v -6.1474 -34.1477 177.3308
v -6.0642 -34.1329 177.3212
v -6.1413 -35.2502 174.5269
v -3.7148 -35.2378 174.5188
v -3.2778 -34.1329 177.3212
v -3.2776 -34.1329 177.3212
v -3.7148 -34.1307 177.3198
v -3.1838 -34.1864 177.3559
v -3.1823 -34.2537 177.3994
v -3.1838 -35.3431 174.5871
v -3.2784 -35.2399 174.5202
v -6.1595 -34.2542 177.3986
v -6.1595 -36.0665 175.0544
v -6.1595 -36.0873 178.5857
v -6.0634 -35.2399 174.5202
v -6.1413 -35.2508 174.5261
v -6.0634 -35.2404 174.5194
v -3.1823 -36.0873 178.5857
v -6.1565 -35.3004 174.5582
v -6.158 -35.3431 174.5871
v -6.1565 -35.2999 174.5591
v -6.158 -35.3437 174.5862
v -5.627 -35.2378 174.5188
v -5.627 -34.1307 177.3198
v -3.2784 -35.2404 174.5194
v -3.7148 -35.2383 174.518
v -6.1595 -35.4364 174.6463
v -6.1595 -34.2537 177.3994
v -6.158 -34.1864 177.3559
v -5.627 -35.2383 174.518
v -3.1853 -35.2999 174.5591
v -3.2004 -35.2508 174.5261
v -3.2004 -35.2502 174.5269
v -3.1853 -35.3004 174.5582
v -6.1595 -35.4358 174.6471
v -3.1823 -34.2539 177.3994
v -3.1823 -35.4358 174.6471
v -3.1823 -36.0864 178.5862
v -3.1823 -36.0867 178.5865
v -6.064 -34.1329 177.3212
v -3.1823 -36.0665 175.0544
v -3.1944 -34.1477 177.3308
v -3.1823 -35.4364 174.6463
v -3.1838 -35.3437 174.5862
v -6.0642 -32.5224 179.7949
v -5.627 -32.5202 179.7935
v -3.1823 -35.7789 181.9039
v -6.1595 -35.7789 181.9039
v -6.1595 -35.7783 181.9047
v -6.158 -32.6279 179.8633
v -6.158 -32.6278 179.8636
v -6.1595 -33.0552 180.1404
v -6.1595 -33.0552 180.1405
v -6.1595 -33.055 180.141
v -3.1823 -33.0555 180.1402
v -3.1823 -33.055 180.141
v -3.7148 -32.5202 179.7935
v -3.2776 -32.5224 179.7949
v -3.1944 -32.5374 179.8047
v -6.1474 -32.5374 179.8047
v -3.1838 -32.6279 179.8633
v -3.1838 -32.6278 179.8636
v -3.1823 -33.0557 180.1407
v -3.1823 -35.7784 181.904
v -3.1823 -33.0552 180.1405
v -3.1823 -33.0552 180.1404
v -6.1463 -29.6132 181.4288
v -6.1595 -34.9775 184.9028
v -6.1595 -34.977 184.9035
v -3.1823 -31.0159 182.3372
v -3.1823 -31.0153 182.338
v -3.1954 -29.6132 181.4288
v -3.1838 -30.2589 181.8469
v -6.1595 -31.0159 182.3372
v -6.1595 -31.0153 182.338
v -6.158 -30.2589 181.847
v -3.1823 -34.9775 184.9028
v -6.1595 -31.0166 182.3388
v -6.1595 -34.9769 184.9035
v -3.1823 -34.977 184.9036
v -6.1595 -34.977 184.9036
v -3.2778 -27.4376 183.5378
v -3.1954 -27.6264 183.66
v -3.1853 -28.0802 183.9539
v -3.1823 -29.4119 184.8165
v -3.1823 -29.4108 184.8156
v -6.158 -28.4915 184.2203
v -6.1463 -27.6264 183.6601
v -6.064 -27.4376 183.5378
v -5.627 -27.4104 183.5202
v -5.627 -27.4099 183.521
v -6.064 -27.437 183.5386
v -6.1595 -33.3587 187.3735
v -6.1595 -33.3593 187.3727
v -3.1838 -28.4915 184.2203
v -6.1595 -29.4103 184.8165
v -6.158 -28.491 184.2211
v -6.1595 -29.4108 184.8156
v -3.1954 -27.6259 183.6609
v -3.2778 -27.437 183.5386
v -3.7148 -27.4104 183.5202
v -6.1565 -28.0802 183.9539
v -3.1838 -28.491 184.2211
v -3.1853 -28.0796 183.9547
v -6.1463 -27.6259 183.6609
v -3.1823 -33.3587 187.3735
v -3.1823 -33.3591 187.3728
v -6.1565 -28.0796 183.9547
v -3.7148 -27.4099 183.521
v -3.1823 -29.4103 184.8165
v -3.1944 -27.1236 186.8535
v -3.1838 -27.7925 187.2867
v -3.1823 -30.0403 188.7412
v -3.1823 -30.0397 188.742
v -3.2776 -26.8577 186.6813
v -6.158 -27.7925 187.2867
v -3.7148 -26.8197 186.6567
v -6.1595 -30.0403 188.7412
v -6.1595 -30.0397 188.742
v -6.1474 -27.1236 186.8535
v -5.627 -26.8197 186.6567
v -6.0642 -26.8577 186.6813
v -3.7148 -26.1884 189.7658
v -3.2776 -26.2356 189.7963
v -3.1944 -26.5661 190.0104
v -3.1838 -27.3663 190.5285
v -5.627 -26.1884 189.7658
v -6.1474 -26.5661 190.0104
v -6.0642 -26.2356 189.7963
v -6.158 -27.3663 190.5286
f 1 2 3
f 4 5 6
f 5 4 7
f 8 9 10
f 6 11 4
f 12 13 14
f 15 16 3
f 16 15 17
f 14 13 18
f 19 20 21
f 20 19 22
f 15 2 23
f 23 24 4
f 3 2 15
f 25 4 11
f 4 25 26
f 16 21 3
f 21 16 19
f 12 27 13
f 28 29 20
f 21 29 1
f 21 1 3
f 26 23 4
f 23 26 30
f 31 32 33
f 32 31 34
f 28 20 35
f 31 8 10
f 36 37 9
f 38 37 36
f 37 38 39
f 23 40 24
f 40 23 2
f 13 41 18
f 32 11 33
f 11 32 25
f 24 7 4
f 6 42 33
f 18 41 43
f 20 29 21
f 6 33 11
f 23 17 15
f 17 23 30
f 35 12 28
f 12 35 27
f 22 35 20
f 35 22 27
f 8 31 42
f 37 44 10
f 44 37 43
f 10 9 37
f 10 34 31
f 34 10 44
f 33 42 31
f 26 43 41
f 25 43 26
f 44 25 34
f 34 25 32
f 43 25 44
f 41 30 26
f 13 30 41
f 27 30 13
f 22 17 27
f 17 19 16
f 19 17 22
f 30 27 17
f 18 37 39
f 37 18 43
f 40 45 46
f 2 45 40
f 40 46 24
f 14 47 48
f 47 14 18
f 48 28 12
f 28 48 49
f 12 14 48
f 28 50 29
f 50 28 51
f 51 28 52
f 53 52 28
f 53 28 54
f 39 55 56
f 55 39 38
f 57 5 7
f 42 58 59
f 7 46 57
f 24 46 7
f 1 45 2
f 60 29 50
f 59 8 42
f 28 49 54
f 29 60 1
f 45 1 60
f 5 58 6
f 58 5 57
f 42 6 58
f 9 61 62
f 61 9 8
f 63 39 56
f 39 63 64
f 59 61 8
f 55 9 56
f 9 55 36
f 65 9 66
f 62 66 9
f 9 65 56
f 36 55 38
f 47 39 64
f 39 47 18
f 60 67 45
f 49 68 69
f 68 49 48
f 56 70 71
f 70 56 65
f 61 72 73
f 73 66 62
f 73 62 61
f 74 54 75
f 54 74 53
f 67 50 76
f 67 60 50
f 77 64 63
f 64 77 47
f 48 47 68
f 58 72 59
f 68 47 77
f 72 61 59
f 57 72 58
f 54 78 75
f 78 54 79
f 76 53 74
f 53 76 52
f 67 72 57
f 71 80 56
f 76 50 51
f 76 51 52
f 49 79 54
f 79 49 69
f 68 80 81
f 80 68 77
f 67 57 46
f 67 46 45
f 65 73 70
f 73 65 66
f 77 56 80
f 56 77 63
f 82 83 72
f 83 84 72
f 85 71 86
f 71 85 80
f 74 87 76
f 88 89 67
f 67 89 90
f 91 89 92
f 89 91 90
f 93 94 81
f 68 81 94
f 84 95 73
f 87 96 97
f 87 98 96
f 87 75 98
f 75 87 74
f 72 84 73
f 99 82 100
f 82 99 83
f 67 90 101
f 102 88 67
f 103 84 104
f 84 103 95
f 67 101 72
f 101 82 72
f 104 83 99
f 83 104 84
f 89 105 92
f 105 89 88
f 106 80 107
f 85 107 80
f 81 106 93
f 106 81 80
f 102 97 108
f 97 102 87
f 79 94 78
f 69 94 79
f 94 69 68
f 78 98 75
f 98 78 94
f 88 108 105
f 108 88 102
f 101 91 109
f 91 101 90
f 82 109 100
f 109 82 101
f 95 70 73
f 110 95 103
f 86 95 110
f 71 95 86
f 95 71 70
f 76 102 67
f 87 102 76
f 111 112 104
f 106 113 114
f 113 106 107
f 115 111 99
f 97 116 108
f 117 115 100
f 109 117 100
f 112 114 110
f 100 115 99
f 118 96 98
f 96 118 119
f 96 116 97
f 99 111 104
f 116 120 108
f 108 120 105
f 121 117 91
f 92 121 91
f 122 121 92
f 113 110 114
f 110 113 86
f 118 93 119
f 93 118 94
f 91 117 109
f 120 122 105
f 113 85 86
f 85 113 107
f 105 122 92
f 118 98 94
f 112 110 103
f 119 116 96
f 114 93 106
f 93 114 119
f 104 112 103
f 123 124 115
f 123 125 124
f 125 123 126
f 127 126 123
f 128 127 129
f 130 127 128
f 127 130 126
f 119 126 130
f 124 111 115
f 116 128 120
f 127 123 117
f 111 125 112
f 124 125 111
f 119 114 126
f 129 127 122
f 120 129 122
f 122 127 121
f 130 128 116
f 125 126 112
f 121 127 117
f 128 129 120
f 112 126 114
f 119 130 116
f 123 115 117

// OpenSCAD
// SOUNDBOX part: harp_wood_inside1
// Inner lining strip. Thin in the e2 direction (OBB thickness ~2.98 model units),
// broad face spans e0 (sweep/stacking axis, ~17.72) x e1 (~7.10).
// Cross-section outline shape varies along the e0 axis -> built as a LOFT:
// hull() of consecutive stacked cross-section polygons (each linear_extrude'd a hair).
//
// Frame contract: rebuild in part PRINCIPAL frame, place with multmatrix.
//   world = centroid + u*e1 + v*e2 + w*e0   (local x=u along e1, y=v along e2, z=w along e0)
// Outline points are (e1, e2) pairs; sections are positioned at z = s along e0.

module sb_harp_wood_inside1() {
    // ---- key dimensions (model world units) ----
    // OBB extents: e0=17.717 (sweep), e1=7.103 (width), e2=2.977 (thickness, thin axis)
    eps = 0.001;            // slab thickness used per section for hull lofting

    // centroid (world)
    cx = -4.670895242189419;
    cy = -32.86783006658697;
    cz = 179.47082189015964;

    // principal axes
    // e0 (section/stacking axis), e1 (outline x), e2 (outline y, thin)
    e0 = [-7.198236352063046e-08, 0.5435756491694905, 0.8393601811081832];
    e1 = [-3.8562726048548236e-05, 0.839360180482577, -0.5435756487676503];
    e2 = [0.9999999992564554, 3.2407144580085266e-05, -2.090133971594858e-05];

    // section positions along e0 (local z) and their (e1,e2) outlines
    s = [
        -5.445743567141493,
        -2.4929627001441386,
        0.45981816685321597,
        3.4125990338505705,
        6.365379900847925,
        9.31816076784528,
        12.270941634842634
    ];

    outline0 = [
        [-0.28423858061108387, 1.488589415933371],
        [-0.28412097685894766, -1.4886113282819196],
        [-0.037238011977131835, -1.4886018432883672],
        [0.46663292684326274, -1.4885824645214034],
        [0.5771064702357185, -1.4870652117922991],
        [0.6285866266420308, -1.485607450292956],
        [0.6877653271956894, -1.470423157369534],
        [0.7000740725017132, -1.3924884191281677],
        [0.7026030400469345, -0.9560731261482711],
        [0.7025378561735616, 0.9561275620747436],
        [0.6999753492587257, 1.3925428977992214],
        [0.6876523202368277, 1.4704769278158705],
        [0.6284641586642077, 1.4856552405996881],
        [0.5769838903505793, 1.48710976204192],
        [0.46651343259493316, 1.4886182796209617],
        [0.16757433444905967, 1.4886072631346956]
    ];

    outline1 = [
        [-2.2211947008880837, 1.4885149353038583],
        [-2.2210802990409326, -1.488685809034434],
        [-1.1255523244791623, -1.488643703018274],
        [-0.5278931458392201, -1.488620724589759],
        [-0.037238011977131835, -1.4886018432883672],
        [0.04289933822961878, -1.4870857601435665],
        [0.08902997589549422, -1.4764972492085515],
        [0.10672122392953276, -1.3932961147342884],
        [0.1092447784548436, -0.9560959480282831],
        [0.10920803936049572, 4.515133049092299e-06],
        [0.10917130027530653, 0.9561047398758028],
        [0.10662244039492941, 1.3933042348610105],
        [0.0889247982433845, 1.476504009687727],
        [0.04279334694764336, 1.48708945274709],
        [-0.03735241382428245, 1.4885989010499256],
        [-0.4884652114010084, 1.4885817935922496],
        [-1.1256501377231491, 1.488557280376455]
    ];

    outline2 = [
        [-3.7660075997312097, 1.4884555318457646],
        [-3.765893197884059, -1.4887452124925282],
        [-0.5213326521875876, -1.4886205396602965],
        [-0.011937596648640247, -1.4870879643085595],
        [0.09594495176406193, -1.4764970804691762],
        [0.11385308403864391, -1.3932959374691758],
        [0.11639978513572624, -0.9560957698465659],
        [0.11632630695618618, 0.9561049180575201],
        [0.11373931284420502, 1.3933044115497653],
        [0.0958199835946415, 1.4765041776662424],
        [-0.012051882236779665, 1.4870872482631672],
        [-0.5214387597285743, 1.488580204996925],
        [-1.553588078503163, 1.488540805686649]
    ];

    outline3 = [
        [-4.723523455708495, 1.4884187070218255],
        [-4.723409053861344, -1.4887820373164673],
        [-4.707726671315054, -1.4887814586841805],
        [-0.28671187640929485, -1.488611543641521],
        [-0.003589048072957457, -1.4885997406002451],
        [0.8983161288740833, -1.4870535031523562],
        [1.6675546817343883, -1.4754005782067228],
        [1.6674313941580925, 1.4755281072835964],
        [0.898213339478771, 1.48712218669846],
        [-0.0037034498651404846, 1.4885995732265742],
        [-1.804047564743576, 1.4885309092462617],
        [-4.308168738395276, 1.4884346832777189]
    ];

    outline4 = [
        [-4.707837871248055, 1.4884190473585353],
        [-4.707726671315054, -1.4887814586841805],
        [-3.8931636419651827, -1.4887501986067415],
        [-1.2486494798911787, -1.488648576857551],
        [-0.003589048072957457, -1.4885997406002451],
        [1.0916765075924113, -1.4870456296219972],
        [1.5817564910248378, -1.4855700459115404],
        [2.1223212090011883, -1.4753816883836677],
        [2.347302295768502, -1.393013734405529],
        [2.3796327019090335, -0.9560084031372116],
        [2.3796042571758145, 9.062983157617328e-05],
        [2.379559223747816, 0.9561918079297159],
        [2.3471952329983496, 1.3931944163085073],
        [2.122207816738517, 1.475545566975609],
        [1.5816423173806624, 1.4856919300442955],
        [1.0915622219951109, 1.4871298213683084],
        [-0.0037034498651404846, 1.4885995732265742],
        [-1.2487638817383293, 1.488552167480741],
        [-2.9212122155895672, 1.4884879307064505]
    ];

    outline5 = [
        [-2.665845037069713, 1.488497671003108],
        [-2.6657306352225625, -1.488703073335185],
        [0.011619597568966356, -1.4870871675198238],
        [0.8084718621407894, -1.476468868390543],
        [1.1252608702512332, -1.3932571993227907],
        [1.170493946504207, -0.9560553921558652],
        [1.1704655017343435, 4.4594487238224526e-05],
        [1.1704204683429902, 0.9561448189110628],
        [1.1251537924104658, 1.393343149953579],
        [0.8083666845161694, 1.4765316752499993],
        [0.011513606277830046, 1.4870882837894122]
    ];

    outline6 = [
        [-1.3929881582241253, 1.487034028716704],
        [-1.3928738726176633, -1.4871416606921806],
        [-0.4396003210213495, -1.476517350421667],
        [-0.04585224169721336, -1.3933022468277474],
        [0.010381785559919088, -0.9561000168725035],
        [0.010351739837562768, -3.029090070105441e-08],
        [0.010308307389539806, 0.9561004326130031],
        [-0.045949424288484586, 1.3932983412476305],
        [-0.43971379295213353, 1.4764831928999458]
    ];

    outlines = [outline0, outline1, outline2, outline3, outline4, outline5, outline6];

    // place in world via principal frame:
    // local x -> e1, local y -> e2, local z -> e0
    multmatrix([
        [e1[0], e2[0], e0[0], cx],
        [e1[1], e2[1], e0[1], cy],
        [e1[2], e2[2], e0[2], cz],
        [0,     0,     0,     1 ]
    ]) {
        // loft: hull consecutive thin slabs placed at z = s[i] along e0
        for (i = [0 : len(s) - 2]) {
            hull() {
                translate([0, 0, s[i]])
                    linear_extrude(height = eps)
                        polygon(points = outlines[i]);
                translate([0, 0, s[i + 1]])
                    linear_extrude(height = eps)
                        polygon(points = outlines[i + 1]);
            }
        }
    }
}

sb_harp_wood_inside1();
